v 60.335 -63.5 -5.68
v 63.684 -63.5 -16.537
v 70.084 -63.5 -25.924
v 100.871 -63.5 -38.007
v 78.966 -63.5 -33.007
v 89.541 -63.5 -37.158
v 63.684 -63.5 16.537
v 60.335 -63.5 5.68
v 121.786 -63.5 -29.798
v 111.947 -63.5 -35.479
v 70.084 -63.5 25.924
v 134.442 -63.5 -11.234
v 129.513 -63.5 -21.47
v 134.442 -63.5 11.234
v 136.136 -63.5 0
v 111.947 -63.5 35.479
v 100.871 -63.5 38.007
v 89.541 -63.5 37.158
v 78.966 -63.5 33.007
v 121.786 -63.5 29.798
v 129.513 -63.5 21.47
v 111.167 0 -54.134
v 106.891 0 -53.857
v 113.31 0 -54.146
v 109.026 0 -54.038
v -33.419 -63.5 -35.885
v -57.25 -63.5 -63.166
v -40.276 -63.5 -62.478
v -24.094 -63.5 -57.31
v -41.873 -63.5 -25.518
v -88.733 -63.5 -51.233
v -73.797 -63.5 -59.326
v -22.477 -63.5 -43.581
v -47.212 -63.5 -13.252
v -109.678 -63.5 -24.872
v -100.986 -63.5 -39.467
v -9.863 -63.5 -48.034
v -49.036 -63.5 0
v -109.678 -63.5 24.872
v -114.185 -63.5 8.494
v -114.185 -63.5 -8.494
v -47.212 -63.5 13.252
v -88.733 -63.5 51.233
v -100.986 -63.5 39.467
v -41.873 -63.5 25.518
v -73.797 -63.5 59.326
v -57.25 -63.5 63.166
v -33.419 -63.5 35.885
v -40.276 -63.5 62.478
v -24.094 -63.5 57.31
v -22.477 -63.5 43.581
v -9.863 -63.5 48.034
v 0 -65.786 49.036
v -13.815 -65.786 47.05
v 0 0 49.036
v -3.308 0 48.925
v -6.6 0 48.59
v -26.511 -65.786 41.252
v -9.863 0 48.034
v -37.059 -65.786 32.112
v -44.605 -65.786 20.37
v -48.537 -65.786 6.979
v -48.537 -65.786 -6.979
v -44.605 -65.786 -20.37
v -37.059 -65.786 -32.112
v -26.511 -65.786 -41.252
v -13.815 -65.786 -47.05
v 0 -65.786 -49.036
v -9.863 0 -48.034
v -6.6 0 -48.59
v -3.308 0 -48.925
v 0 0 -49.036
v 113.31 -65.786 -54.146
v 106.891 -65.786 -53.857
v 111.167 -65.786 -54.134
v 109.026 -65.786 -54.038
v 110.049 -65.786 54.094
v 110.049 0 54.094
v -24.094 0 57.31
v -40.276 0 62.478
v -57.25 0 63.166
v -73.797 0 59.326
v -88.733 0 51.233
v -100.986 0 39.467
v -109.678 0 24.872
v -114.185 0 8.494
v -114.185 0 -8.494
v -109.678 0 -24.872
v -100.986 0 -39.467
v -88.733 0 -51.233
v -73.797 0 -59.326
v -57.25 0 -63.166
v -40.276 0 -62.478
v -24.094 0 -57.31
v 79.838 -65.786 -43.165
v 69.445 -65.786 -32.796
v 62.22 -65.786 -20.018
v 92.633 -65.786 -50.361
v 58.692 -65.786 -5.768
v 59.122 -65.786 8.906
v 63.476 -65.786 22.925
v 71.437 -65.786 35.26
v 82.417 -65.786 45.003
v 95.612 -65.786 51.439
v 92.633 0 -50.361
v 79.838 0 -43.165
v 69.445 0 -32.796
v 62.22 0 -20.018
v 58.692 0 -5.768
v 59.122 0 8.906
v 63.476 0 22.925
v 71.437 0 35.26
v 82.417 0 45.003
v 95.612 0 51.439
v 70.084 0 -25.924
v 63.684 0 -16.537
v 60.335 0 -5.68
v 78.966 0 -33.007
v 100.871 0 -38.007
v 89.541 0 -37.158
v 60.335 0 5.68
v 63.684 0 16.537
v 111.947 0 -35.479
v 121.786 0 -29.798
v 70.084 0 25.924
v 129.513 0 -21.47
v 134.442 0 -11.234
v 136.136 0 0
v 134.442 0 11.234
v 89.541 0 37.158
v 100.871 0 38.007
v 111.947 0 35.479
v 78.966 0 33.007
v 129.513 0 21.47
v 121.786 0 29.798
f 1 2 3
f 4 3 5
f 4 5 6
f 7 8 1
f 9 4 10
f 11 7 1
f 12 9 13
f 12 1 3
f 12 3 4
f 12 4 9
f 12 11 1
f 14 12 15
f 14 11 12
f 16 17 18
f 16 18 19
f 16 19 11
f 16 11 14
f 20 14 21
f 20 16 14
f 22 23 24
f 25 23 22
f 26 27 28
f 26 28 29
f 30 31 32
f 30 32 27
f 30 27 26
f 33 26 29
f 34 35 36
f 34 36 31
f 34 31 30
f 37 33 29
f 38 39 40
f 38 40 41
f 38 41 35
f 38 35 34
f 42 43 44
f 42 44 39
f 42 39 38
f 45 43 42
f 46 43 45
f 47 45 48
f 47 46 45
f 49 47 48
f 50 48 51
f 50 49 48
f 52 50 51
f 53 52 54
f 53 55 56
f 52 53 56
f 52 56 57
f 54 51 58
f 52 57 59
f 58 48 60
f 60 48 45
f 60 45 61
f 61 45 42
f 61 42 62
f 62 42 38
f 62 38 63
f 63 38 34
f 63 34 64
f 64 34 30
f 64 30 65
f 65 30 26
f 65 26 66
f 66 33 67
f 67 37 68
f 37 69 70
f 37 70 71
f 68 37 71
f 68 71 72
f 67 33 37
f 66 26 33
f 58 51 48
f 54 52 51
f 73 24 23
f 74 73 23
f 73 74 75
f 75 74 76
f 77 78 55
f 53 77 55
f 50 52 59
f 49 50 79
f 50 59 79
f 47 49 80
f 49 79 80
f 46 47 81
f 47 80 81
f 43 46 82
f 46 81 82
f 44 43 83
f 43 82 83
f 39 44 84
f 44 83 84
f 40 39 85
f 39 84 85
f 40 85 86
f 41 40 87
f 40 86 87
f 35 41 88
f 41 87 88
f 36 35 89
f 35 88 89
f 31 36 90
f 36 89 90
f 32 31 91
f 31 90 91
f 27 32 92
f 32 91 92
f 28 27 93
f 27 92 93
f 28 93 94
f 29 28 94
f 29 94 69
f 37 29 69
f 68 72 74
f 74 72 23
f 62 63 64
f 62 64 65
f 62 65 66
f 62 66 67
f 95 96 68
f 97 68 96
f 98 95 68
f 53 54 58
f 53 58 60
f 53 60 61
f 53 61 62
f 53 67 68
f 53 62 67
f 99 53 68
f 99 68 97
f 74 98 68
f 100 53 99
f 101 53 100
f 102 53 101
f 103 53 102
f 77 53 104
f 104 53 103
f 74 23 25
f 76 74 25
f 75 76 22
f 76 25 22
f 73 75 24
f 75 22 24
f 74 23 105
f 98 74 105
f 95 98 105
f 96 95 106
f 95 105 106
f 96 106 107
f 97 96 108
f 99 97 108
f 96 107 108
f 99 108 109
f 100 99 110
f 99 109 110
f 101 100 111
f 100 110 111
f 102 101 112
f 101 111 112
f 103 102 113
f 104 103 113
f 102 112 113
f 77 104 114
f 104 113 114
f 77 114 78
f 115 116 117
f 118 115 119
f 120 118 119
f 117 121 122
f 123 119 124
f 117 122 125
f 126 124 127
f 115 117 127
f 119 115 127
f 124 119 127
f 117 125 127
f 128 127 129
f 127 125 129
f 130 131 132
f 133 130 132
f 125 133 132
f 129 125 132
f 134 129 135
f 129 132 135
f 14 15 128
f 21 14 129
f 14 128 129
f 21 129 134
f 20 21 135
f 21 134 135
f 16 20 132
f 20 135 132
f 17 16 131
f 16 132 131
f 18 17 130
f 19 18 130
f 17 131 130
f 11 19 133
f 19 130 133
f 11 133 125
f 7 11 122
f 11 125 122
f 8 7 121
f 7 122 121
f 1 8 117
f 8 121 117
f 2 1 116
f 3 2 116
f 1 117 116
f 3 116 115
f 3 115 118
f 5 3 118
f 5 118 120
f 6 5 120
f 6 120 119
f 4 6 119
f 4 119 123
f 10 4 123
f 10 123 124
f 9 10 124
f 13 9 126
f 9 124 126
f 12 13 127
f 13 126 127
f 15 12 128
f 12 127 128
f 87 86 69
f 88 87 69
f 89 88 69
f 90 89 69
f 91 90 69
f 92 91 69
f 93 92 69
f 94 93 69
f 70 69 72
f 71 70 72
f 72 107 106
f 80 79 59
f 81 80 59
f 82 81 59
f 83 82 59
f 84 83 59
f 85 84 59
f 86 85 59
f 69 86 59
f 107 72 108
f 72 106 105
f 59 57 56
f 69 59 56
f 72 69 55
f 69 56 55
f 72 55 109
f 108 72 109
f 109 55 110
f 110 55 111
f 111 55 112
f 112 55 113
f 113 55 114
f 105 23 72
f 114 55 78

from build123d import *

# Parameters (mm, degrees)
F1_DEPTH = 65.786
F2_R     = 38.113147
F2_R_2   = 63.444763
F3_DEPTH = 63.5


with BuildPart() as f1:
    # F0 (on Front) → F1 (new body)
    with BuildSketch(Plane.XZ):
        with BuildLine():
            Line((113.310461, -54.146026), (106.890701, -53.856522))
            ThreePointArc((106.890701, -53.856522), (110.096283, -54.096589), (113.310461, -54.146026))
        make_face()
        with BuildLine():
            ThreePointArc((0, 49.0362), (34.67383, 34.67383), (49.0362, 0))
            ThreePointArc((49.0362, 0), (34.67383, -34.67383), (0, -49.0362))
            Line((0, -49.0362), (106.890701, -53.856522))
            ThreePointArc((106.890701, -53.856522), (58.407412, 1.583845), (110.049442, 54.094457))
            Line((110.049442, 54.094457), (0, 49.0362))
        make_face()
        with BuildLine():
            ThreePointArc((0, -49.0362), (34.67383, -34.67383), (49.0362, 0))
            ThreePointArc((49.0362, 0), (34.67383, 34.67383), (0, 49.0362))
            ThreePointArc((0, 49.0362), (-49.0362, 0), (0, -49.0362))
        make_face()
    extrude(amount=F1_DEPTH)

    # F2 (on Front) → F3 (join)
    with BuildSketch(Plane.XZ):
        with Locations((98.022446, 0)):
            Circle(F2_R)
        with Locations((-51.311396, 0)):
            Circle(F2_R_2)
    extrude(amount=F3_DEPTH)


solid = f1.part
